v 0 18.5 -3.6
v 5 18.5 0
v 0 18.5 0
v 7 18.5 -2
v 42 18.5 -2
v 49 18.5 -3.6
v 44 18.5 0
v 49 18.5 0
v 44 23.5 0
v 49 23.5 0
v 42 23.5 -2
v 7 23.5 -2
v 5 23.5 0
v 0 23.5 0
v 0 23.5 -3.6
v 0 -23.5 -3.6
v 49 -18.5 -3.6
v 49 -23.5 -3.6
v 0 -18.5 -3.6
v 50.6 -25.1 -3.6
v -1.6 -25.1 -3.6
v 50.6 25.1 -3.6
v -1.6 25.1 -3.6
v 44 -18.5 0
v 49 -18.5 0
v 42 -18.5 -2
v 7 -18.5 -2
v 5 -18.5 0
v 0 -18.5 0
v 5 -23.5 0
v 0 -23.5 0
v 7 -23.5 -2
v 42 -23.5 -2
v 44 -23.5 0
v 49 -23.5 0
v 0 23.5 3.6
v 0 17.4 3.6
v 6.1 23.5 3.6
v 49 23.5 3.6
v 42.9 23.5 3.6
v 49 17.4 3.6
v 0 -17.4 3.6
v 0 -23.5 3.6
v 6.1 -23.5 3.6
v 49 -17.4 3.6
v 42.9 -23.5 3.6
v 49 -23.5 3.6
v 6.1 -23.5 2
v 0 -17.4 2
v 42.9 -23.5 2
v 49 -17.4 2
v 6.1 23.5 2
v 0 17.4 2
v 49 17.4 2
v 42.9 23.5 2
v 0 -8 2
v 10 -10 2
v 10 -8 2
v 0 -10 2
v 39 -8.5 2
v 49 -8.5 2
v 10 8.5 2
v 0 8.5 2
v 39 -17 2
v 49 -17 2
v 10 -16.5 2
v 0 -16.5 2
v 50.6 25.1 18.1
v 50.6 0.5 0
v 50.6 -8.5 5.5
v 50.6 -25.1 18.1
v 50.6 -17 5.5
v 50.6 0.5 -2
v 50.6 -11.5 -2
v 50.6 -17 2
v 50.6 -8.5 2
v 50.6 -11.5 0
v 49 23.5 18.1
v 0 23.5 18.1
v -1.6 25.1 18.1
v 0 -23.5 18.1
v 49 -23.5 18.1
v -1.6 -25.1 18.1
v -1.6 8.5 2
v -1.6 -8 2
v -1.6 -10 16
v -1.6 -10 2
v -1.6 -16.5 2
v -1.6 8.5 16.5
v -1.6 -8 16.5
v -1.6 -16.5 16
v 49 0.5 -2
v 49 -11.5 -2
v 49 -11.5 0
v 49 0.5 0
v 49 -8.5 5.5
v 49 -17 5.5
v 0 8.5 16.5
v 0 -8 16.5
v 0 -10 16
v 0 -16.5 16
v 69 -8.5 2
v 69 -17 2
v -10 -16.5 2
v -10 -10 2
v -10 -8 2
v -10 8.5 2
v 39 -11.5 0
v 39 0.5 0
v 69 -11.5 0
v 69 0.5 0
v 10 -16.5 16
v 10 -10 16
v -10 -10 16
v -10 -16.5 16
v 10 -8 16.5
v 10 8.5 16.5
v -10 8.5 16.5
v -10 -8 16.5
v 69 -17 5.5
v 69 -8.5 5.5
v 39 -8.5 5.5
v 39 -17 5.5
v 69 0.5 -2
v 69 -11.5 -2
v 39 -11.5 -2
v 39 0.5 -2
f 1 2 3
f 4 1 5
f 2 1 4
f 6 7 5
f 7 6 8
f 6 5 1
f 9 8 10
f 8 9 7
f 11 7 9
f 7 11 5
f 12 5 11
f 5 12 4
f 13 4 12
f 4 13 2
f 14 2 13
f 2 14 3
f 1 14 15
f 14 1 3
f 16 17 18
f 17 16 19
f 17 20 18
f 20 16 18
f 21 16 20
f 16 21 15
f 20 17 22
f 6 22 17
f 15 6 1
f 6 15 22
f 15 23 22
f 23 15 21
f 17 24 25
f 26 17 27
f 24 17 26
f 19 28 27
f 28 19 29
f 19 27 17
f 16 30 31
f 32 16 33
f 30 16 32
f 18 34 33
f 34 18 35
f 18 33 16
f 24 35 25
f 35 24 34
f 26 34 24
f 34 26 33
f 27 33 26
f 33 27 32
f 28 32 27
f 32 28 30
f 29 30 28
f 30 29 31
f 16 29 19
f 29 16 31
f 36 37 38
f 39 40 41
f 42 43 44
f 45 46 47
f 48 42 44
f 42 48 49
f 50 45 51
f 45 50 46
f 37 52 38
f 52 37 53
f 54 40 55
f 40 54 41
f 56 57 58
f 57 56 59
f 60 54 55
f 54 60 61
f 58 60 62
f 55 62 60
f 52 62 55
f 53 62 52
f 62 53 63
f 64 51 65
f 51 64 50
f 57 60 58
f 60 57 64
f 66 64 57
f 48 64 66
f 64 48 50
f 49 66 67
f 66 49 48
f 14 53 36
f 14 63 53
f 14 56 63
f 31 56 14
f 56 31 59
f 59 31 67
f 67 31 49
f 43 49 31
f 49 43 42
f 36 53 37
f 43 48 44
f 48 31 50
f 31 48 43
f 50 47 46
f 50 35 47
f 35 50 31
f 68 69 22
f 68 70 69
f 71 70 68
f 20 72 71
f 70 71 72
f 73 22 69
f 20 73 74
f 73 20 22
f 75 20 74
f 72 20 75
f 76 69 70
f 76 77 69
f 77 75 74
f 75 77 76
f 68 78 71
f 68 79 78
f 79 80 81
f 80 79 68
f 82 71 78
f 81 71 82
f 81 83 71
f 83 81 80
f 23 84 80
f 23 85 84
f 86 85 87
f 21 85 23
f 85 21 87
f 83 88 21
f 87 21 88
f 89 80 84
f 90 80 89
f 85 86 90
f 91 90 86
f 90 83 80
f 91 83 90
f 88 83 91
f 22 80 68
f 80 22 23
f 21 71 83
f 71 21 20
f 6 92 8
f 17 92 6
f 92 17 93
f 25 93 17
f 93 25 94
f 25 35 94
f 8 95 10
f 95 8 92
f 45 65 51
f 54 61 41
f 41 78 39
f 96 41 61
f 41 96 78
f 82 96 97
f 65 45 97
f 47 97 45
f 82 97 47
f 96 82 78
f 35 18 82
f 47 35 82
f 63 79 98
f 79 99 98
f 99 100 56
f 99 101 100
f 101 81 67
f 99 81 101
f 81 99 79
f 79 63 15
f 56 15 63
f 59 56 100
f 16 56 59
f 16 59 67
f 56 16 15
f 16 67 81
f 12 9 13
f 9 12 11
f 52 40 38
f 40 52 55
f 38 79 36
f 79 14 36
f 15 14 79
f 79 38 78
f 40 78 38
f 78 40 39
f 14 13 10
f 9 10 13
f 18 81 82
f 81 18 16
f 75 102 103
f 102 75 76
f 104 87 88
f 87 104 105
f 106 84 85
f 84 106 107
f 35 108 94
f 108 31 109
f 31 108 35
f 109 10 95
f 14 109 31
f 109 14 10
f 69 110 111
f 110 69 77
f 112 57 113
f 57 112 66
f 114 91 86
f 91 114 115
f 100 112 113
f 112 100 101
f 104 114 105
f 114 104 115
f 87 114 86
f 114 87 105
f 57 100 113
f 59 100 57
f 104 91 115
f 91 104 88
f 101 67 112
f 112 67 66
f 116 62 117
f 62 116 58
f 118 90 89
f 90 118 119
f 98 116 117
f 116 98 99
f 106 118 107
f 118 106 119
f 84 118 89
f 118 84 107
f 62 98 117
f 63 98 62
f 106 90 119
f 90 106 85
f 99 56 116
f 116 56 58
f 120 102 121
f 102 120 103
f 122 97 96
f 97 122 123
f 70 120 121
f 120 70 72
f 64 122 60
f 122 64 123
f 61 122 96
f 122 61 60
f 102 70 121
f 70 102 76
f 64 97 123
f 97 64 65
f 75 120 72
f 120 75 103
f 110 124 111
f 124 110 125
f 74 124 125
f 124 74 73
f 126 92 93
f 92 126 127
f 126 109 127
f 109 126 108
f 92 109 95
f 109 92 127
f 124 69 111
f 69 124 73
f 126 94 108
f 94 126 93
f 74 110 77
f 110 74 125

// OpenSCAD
// file: config.scad
thickness = 1.6;

enable_opi0_panel = 0;
enable_connector_panel = 0;

// Screw coordinates
screw_place = [
    [0, -22, 5],
    [0, 22, 5],
    [0, -20, 64],
    [0, 20, 64],
    [0, 0, 110]
];

// Connetor back panel
connector_panel_x_offset = 8;
connector_panel_z_offset = 12;
connector_panel_l = 20;
connector_panel_w = 36;
connector_panel_h = 16;

// Orange pi zero holder
pcb_l = 48 + 1;
pcb_w = 45 + 2;
pcb_h = 15 + 3.5;
pcb_thickness = 2;
pcb_screw_place = 5;
pcb_bottom_space = 2;

usb_width = 6.5;
usb_height = 14;
usb_offset = 7;
usb_floor_offset = pcb_thickness;

eth_width = 16.5;
eth_height = 14.5;
eth_offset = pcb_w-eth_width-15;
eth_floor_offset = pcb_thickness;

musb_width = 8.5;
musb_height = 3.5;
musb_offset = pcb_w-musb_width-32;
musb_floor_offset = pcb_thickness;

msd_width = 12;
msd_height = 2;
msd_offset = 12;
msd_floor_offset = -msd_height;

holder_size = 6.1;
// main file
include <config.scad>

opi0_holder();

#opi0_pcb();

module opi0_holder() {
    translate([0,0,-pcb_bottom_space-thickness]) {
        translate([0, pcb_w/2-pcb_screw_place, 0]) pcb_bottom_rail();
        translate([0, -pcb_w/2, 0]) pcb_bottom_rail();
    }
    translate([0,0,pcb_thickness]) pcb_top_rail();

    // Outer box
    outer_l = pcb_l + thickness*2;
    outer_w = pcb_w + thickness*2;
    outer_h = pcb_h + thickness*2;
    difference() {
        translate([-thickness, -outer_w/2, -(thickness+pcb_bottom_space)]) difference() {
            cube([outer_l, outer_w, outer_h]);
            translate([thickness, thickness, -thickness]) cube([pcb_l, pcb_w, pcb_h*2]);
        }
        opi0_pcb();
    }
}

module pcb_top_rail() {
    translate([0,-pcb_w/2,0])
    intersection() {
        cube([pcb_l, pcb_w, thickness]);
        square_side = sqrt(2)*holder_size;
        union() {
            translate([0, 0]) rotate([0,0,45]) cube([square_side, square_side, thickness*2], center=true);
            translate([pcb_l, 0]) rotate([0,0,45]) cube([square_side, square_side, thickness*2], center=true);
            translate([0, pcb_w]) rotate([0,0,45]) cube([square_side, square_side, thickness*2], center=true);
            translate([pcb_l, pcb_w]) rotate([0,0,45]) cube([square_side, square_side, thickness*2], center=true);
        }
    }

}

module pcb_bottom_rail() {
    translate([0, pcb_screw_place, 0])
    rotate([90, 0, 0])
    linear_extrude(height=pcb_screw_place)
    polygon([
        [0, 0],
        [0, thickness+pcb_bottom_space],
        [pcb_screw_place, thickness+pcb_bottom_space],
        [pcb_screw_place+pcb_bottom_space, thickness],
        [pcb_l-(pcb_screw_place+pcb_bottom_space), thickness],
        [pcb_l-pcb_screw_place, thickness+pcb_bottom_space],
        [pcb_l, thickness+pcb_bottom_space],
        [pcb_l, 0],
    ]);
}


// Simple model of Orange Pi Zero for cut holes
module opi0_pcb() {
    translate([0, -pcb_w/2, 0]) {
        cube([pcb_l, pcb_w, pcb_thickness]);
        translate([-10, usb_offset, usb_floor_offset])
            cube([20, usb_width, usb_height]);
        translate([-10, eth_offset, eth_floor_offset])
            cube([20, eth_width, eth_height]);
        translate([pcb_l-10, musb_offset, musb_floor_offset])
            cube([30, musb_width, musb_height]);
        translate([pcb_l-10, msd_offset, msd_floor_offset])
            cube([30, msd_width, msd_height]);
    }
}
